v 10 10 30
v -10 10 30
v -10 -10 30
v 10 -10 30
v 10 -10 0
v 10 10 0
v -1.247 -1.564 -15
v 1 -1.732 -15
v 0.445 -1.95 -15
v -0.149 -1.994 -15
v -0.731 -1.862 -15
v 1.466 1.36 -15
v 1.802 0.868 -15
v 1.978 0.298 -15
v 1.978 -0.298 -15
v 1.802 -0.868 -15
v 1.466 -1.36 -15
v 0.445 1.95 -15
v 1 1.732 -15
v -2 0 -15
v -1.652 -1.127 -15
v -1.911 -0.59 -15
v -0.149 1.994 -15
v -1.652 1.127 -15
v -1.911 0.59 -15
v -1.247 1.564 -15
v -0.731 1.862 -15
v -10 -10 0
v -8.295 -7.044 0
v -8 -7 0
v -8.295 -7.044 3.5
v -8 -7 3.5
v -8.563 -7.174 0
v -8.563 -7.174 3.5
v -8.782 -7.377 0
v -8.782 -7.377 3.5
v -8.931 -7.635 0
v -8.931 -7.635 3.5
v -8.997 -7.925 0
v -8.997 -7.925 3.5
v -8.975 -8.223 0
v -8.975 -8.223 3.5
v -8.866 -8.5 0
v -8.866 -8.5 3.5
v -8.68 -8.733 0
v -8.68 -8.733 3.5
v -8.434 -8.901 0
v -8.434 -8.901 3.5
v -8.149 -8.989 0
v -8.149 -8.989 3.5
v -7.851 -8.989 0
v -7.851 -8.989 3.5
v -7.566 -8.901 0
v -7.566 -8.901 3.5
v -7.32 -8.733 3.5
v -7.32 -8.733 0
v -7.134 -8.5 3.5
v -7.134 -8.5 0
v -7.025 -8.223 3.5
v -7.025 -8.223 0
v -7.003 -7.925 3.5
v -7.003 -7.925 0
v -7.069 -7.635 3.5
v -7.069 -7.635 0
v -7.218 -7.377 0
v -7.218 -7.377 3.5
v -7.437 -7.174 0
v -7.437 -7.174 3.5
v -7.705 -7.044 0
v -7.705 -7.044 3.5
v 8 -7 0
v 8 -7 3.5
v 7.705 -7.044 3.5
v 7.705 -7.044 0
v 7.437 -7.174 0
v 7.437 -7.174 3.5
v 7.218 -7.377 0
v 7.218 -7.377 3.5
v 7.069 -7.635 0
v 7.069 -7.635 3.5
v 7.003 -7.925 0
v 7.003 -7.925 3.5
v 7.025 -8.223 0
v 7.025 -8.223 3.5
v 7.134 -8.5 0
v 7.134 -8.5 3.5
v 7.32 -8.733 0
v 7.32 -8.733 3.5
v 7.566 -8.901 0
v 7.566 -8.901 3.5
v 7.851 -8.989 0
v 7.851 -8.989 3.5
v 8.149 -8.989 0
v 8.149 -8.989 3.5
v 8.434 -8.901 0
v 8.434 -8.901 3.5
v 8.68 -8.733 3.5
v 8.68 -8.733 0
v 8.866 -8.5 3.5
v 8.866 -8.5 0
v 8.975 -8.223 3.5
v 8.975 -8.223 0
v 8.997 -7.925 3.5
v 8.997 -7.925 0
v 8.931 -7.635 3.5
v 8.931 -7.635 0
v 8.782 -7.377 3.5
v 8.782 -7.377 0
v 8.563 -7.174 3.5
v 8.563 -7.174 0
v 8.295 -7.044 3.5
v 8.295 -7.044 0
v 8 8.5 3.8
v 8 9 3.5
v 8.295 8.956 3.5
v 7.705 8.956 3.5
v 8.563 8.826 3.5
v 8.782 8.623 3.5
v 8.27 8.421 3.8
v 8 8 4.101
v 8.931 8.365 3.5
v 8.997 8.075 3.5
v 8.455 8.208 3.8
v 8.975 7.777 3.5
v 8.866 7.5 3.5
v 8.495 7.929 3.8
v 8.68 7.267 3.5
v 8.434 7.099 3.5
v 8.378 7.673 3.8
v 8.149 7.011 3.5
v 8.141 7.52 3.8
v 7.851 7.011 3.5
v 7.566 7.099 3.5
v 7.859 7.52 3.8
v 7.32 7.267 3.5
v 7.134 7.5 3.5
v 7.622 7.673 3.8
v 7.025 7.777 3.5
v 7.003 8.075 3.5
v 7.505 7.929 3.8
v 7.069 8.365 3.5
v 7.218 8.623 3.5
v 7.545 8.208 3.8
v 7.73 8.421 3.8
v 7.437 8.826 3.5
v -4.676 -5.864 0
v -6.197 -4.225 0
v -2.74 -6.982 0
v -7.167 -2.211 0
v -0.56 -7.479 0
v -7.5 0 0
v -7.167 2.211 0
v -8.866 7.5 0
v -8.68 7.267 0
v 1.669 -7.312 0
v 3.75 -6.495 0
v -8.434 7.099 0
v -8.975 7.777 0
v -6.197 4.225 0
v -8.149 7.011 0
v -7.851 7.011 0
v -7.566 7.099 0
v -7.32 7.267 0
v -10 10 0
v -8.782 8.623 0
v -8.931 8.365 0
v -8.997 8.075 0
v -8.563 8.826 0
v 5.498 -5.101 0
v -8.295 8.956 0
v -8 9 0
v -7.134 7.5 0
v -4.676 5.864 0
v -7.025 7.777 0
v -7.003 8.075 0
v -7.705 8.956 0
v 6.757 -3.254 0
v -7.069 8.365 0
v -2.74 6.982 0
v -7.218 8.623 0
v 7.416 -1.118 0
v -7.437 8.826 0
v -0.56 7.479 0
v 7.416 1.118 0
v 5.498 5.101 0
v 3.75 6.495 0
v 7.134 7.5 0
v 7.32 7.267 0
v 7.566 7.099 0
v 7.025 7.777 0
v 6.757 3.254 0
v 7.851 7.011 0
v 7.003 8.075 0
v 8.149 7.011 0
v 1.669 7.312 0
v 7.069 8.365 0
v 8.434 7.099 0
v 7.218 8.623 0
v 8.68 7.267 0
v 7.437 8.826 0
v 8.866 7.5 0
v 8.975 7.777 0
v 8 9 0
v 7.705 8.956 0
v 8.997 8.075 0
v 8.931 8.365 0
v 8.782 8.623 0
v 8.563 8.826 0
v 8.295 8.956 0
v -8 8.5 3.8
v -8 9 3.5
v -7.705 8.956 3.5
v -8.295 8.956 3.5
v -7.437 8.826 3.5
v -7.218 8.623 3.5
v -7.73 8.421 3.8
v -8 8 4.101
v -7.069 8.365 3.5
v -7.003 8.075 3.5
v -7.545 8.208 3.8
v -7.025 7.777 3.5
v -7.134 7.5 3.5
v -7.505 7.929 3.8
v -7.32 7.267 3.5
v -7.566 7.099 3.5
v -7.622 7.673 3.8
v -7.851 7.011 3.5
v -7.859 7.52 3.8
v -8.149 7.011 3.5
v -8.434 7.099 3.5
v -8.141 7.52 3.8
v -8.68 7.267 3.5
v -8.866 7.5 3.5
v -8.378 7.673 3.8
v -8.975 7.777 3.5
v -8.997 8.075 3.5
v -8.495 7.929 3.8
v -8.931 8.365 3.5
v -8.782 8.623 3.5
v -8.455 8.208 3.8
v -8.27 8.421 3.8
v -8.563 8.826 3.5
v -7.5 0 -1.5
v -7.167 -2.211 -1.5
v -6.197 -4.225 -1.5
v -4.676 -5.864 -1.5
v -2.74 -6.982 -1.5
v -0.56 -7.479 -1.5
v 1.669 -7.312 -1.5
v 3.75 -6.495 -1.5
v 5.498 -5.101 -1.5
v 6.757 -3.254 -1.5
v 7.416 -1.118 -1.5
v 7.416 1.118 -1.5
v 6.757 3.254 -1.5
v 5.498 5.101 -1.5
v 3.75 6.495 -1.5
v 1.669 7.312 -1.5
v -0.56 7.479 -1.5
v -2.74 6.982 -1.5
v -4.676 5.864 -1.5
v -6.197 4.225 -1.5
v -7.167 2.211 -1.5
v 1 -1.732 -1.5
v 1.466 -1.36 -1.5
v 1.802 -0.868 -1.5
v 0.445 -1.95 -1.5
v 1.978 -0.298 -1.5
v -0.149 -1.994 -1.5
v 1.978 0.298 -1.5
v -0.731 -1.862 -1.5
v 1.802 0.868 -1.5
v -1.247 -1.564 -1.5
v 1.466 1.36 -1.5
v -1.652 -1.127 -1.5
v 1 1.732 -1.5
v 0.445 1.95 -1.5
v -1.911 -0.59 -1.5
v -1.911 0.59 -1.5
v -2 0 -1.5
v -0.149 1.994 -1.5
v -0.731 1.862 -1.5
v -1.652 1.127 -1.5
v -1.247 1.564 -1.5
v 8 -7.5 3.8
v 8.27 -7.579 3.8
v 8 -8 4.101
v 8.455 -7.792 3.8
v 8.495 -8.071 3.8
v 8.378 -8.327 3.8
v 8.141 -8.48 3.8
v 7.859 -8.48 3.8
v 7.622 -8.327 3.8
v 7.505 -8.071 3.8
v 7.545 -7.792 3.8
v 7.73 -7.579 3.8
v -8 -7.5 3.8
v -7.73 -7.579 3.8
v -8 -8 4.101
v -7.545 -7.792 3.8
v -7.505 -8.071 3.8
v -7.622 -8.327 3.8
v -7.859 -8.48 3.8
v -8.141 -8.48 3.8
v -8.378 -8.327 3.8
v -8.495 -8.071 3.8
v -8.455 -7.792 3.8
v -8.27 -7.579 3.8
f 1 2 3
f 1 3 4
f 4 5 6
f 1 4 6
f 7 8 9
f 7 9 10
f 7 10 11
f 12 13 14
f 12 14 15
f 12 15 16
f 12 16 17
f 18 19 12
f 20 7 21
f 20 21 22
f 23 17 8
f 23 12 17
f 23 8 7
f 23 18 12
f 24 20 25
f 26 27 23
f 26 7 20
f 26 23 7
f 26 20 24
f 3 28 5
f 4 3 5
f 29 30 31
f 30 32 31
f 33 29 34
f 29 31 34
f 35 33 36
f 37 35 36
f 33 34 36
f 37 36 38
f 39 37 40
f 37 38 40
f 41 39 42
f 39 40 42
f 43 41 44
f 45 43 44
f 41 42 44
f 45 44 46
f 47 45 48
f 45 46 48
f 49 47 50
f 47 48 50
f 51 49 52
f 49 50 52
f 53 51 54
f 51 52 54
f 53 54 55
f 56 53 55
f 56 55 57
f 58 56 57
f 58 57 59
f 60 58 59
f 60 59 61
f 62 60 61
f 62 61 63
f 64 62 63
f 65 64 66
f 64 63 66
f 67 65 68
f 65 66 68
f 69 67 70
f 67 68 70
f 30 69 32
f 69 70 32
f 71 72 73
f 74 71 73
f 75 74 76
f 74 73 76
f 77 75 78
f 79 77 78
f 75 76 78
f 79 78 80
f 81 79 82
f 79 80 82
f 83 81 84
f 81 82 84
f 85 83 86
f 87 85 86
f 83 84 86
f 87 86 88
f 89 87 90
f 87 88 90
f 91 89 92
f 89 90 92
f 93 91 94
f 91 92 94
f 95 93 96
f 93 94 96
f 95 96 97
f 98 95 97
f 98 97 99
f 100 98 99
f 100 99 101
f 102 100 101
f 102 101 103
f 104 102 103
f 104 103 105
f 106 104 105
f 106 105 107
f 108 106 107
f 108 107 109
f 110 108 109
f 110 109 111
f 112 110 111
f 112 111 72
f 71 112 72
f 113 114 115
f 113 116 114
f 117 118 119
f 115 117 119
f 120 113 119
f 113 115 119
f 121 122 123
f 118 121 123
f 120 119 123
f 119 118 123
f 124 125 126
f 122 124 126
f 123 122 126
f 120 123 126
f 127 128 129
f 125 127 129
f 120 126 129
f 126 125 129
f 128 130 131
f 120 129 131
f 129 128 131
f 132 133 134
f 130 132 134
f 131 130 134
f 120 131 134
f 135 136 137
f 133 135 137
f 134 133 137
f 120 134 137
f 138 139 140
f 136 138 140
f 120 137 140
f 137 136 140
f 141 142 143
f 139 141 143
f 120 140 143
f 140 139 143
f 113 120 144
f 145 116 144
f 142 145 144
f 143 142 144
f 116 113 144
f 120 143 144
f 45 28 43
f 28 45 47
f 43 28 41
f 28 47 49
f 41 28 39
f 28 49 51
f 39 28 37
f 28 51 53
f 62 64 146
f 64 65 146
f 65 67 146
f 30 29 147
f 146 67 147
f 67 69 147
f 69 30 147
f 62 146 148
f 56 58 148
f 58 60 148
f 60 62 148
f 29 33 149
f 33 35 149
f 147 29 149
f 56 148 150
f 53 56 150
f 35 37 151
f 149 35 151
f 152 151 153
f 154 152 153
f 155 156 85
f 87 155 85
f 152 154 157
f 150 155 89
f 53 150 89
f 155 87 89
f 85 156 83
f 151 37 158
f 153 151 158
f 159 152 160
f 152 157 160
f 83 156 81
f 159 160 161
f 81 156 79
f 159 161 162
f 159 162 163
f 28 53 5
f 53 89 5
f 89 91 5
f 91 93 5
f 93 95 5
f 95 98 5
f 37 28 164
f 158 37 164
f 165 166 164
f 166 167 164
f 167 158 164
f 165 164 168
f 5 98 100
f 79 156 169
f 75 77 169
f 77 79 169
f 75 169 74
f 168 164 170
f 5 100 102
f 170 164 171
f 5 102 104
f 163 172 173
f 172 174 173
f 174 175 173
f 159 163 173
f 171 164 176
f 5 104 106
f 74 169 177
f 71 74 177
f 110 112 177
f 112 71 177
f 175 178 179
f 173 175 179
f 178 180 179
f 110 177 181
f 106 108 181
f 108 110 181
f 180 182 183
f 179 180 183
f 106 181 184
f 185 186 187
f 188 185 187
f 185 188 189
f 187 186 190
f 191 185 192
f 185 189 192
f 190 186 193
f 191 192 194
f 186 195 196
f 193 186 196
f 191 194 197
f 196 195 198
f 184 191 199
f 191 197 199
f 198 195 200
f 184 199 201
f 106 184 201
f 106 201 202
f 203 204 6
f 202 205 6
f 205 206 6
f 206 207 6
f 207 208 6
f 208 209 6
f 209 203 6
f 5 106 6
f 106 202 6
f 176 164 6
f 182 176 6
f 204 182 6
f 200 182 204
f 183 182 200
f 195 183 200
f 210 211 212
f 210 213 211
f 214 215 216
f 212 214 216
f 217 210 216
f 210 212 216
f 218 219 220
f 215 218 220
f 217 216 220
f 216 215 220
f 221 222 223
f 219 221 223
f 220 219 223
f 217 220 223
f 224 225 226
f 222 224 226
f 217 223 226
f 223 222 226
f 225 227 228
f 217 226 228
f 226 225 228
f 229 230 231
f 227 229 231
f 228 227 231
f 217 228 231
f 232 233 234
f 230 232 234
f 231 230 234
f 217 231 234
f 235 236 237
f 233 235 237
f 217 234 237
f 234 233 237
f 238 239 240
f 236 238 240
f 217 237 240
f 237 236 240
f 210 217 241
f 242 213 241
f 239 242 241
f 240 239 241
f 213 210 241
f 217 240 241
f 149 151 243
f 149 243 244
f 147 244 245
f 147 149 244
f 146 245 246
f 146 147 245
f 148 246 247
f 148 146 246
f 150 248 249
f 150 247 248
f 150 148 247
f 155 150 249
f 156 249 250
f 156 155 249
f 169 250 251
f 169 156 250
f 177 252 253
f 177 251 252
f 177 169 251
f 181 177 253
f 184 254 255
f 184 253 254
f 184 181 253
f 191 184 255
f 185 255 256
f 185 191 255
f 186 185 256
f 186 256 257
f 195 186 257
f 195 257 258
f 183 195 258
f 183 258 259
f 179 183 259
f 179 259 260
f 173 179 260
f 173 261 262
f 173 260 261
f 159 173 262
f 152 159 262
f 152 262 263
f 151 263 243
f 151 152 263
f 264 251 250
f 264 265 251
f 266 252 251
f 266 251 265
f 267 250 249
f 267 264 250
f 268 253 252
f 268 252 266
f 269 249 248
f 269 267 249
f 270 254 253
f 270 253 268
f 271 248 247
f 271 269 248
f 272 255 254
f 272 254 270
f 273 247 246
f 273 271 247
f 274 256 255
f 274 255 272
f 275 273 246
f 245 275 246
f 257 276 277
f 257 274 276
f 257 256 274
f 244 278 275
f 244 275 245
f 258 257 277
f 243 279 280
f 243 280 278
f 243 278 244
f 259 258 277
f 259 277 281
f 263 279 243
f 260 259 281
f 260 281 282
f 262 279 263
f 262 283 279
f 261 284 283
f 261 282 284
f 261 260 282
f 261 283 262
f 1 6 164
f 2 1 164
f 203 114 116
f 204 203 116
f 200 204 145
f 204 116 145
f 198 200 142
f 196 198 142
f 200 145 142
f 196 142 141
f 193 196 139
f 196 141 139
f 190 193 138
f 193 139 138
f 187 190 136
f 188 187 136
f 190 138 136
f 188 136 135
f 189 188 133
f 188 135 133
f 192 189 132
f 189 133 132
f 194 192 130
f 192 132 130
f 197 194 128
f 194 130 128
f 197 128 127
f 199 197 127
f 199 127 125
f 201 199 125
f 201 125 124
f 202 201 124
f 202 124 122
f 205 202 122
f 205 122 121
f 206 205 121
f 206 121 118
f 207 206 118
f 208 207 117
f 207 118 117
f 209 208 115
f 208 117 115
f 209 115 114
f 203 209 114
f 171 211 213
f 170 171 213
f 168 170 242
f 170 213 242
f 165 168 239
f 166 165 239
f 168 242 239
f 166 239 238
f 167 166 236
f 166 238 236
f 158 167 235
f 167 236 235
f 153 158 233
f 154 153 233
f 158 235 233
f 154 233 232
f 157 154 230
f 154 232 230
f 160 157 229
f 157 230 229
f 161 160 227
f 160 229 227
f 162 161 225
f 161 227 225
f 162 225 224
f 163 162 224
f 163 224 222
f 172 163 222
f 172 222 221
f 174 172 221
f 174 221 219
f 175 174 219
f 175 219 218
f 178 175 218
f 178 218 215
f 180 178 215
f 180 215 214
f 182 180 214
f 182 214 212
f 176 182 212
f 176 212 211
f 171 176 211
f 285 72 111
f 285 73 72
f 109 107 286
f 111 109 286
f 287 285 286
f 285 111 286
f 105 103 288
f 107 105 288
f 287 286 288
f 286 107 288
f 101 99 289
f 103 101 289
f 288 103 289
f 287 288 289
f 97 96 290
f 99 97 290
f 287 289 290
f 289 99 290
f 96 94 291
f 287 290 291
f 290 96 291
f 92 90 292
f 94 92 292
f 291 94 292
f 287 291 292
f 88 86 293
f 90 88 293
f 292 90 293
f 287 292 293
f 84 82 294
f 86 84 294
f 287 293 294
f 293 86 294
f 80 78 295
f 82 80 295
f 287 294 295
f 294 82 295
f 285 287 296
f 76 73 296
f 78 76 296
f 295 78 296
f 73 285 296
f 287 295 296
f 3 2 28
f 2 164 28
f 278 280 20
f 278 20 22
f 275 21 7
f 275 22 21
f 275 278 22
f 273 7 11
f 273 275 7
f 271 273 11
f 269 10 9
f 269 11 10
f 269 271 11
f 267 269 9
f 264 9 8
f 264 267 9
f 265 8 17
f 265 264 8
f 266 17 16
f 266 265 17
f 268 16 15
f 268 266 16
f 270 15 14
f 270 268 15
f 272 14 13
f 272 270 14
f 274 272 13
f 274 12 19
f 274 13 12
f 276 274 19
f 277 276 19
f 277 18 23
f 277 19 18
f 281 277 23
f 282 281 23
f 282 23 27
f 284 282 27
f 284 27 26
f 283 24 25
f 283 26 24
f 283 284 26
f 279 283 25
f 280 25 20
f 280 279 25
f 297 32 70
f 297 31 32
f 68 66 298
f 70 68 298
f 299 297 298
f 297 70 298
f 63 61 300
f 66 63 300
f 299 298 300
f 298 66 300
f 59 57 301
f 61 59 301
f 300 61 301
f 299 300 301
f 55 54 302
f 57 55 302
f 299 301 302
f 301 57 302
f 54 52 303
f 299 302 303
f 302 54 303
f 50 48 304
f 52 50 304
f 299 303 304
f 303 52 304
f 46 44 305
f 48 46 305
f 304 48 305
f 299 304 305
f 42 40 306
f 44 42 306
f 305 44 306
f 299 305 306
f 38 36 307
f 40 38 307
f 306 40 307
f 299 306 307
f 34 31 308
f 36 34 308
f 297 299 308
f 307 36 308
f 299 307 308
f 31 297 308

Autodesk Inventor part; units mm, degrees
ref_plane "YZ Plane" through (0, 0, 0) normal (1, 0, 0) x (0, 1, 0)
ref_plane "XZ Plane" through (0, 0, 0) normal (0, 1, 0) x (-1, 0, 0)
ref_plane "XY Plane" through (0, 0, 0) normal (0, 0, 1) x (1, 0, 0)
sketch "Sketch1" plane through (0, 0, 0) normal (0, 0, 1) x (1, 0, 0)
  line L0 (-10, -10) -> (10, -10)
  line L1 (10, -10) -> (10, 10)
  line L2 (10, 10) -> (-10, 10)
  line L3 (-10, 10) -> (-10, -10)
  line L4 (-10, -10) -> (10, 10) construction
  line L5 (10, -10) -> (-10, 10) construction
  point P0 (0, 0)
  dimension "d0" = 20
  dimension "d1" = 20
extrude "Extrusion1" add sketch "Sketch1" along normal blind 30
sketch "Sketch2" plane through (0, 0, 0) normal (0, 0, -1) x (-1, 0, 0)
  point P0 (0, 0)
  point P1 (-8, 8)
  point P2 (8, 8)
  point P3 (8, -8)
  point P4 (-8, -8)
  dimension "d4" = 8
  dimension "d5" = 8
  dimension "d6" = 8
  dimension "d7" = 8
  dimension "d8" = 8
  dimension "d9" = 8
  dimension "d10" = 8
  dimension "d11" = 8
hole "Hole1" at (8, 8, 0) at (-8, 8, 0) at (-8, -8, 0) at (8, -8, 0) direction (0, 0, 1) diameter 2 depth 3.5 tip angle 118
sketch "Sketch3" plane through (0, 0, 0) normal (0, 0, -1) x (-1, 0, 0)
  circle A0 centre (0, 0) radius 7.5
  dimension "d19" = 15
extrude "Extrusion2" add sketch "Sketch3" along normal blind 1.5
sketch "Sketch4" plane through (0, 0, -1.5) normal (0, 0, -1) x (-1, 0, 0)
  circle A0 centre (0, 0) radius 7.5 projected
  circle A1 centre (0, 0) radius 2
  dimension "d22" = 4
extrude "Extrusion3" add sketch "Sketch4" along normal blind 13.5 contours A1
properties part number "NEMA8"
